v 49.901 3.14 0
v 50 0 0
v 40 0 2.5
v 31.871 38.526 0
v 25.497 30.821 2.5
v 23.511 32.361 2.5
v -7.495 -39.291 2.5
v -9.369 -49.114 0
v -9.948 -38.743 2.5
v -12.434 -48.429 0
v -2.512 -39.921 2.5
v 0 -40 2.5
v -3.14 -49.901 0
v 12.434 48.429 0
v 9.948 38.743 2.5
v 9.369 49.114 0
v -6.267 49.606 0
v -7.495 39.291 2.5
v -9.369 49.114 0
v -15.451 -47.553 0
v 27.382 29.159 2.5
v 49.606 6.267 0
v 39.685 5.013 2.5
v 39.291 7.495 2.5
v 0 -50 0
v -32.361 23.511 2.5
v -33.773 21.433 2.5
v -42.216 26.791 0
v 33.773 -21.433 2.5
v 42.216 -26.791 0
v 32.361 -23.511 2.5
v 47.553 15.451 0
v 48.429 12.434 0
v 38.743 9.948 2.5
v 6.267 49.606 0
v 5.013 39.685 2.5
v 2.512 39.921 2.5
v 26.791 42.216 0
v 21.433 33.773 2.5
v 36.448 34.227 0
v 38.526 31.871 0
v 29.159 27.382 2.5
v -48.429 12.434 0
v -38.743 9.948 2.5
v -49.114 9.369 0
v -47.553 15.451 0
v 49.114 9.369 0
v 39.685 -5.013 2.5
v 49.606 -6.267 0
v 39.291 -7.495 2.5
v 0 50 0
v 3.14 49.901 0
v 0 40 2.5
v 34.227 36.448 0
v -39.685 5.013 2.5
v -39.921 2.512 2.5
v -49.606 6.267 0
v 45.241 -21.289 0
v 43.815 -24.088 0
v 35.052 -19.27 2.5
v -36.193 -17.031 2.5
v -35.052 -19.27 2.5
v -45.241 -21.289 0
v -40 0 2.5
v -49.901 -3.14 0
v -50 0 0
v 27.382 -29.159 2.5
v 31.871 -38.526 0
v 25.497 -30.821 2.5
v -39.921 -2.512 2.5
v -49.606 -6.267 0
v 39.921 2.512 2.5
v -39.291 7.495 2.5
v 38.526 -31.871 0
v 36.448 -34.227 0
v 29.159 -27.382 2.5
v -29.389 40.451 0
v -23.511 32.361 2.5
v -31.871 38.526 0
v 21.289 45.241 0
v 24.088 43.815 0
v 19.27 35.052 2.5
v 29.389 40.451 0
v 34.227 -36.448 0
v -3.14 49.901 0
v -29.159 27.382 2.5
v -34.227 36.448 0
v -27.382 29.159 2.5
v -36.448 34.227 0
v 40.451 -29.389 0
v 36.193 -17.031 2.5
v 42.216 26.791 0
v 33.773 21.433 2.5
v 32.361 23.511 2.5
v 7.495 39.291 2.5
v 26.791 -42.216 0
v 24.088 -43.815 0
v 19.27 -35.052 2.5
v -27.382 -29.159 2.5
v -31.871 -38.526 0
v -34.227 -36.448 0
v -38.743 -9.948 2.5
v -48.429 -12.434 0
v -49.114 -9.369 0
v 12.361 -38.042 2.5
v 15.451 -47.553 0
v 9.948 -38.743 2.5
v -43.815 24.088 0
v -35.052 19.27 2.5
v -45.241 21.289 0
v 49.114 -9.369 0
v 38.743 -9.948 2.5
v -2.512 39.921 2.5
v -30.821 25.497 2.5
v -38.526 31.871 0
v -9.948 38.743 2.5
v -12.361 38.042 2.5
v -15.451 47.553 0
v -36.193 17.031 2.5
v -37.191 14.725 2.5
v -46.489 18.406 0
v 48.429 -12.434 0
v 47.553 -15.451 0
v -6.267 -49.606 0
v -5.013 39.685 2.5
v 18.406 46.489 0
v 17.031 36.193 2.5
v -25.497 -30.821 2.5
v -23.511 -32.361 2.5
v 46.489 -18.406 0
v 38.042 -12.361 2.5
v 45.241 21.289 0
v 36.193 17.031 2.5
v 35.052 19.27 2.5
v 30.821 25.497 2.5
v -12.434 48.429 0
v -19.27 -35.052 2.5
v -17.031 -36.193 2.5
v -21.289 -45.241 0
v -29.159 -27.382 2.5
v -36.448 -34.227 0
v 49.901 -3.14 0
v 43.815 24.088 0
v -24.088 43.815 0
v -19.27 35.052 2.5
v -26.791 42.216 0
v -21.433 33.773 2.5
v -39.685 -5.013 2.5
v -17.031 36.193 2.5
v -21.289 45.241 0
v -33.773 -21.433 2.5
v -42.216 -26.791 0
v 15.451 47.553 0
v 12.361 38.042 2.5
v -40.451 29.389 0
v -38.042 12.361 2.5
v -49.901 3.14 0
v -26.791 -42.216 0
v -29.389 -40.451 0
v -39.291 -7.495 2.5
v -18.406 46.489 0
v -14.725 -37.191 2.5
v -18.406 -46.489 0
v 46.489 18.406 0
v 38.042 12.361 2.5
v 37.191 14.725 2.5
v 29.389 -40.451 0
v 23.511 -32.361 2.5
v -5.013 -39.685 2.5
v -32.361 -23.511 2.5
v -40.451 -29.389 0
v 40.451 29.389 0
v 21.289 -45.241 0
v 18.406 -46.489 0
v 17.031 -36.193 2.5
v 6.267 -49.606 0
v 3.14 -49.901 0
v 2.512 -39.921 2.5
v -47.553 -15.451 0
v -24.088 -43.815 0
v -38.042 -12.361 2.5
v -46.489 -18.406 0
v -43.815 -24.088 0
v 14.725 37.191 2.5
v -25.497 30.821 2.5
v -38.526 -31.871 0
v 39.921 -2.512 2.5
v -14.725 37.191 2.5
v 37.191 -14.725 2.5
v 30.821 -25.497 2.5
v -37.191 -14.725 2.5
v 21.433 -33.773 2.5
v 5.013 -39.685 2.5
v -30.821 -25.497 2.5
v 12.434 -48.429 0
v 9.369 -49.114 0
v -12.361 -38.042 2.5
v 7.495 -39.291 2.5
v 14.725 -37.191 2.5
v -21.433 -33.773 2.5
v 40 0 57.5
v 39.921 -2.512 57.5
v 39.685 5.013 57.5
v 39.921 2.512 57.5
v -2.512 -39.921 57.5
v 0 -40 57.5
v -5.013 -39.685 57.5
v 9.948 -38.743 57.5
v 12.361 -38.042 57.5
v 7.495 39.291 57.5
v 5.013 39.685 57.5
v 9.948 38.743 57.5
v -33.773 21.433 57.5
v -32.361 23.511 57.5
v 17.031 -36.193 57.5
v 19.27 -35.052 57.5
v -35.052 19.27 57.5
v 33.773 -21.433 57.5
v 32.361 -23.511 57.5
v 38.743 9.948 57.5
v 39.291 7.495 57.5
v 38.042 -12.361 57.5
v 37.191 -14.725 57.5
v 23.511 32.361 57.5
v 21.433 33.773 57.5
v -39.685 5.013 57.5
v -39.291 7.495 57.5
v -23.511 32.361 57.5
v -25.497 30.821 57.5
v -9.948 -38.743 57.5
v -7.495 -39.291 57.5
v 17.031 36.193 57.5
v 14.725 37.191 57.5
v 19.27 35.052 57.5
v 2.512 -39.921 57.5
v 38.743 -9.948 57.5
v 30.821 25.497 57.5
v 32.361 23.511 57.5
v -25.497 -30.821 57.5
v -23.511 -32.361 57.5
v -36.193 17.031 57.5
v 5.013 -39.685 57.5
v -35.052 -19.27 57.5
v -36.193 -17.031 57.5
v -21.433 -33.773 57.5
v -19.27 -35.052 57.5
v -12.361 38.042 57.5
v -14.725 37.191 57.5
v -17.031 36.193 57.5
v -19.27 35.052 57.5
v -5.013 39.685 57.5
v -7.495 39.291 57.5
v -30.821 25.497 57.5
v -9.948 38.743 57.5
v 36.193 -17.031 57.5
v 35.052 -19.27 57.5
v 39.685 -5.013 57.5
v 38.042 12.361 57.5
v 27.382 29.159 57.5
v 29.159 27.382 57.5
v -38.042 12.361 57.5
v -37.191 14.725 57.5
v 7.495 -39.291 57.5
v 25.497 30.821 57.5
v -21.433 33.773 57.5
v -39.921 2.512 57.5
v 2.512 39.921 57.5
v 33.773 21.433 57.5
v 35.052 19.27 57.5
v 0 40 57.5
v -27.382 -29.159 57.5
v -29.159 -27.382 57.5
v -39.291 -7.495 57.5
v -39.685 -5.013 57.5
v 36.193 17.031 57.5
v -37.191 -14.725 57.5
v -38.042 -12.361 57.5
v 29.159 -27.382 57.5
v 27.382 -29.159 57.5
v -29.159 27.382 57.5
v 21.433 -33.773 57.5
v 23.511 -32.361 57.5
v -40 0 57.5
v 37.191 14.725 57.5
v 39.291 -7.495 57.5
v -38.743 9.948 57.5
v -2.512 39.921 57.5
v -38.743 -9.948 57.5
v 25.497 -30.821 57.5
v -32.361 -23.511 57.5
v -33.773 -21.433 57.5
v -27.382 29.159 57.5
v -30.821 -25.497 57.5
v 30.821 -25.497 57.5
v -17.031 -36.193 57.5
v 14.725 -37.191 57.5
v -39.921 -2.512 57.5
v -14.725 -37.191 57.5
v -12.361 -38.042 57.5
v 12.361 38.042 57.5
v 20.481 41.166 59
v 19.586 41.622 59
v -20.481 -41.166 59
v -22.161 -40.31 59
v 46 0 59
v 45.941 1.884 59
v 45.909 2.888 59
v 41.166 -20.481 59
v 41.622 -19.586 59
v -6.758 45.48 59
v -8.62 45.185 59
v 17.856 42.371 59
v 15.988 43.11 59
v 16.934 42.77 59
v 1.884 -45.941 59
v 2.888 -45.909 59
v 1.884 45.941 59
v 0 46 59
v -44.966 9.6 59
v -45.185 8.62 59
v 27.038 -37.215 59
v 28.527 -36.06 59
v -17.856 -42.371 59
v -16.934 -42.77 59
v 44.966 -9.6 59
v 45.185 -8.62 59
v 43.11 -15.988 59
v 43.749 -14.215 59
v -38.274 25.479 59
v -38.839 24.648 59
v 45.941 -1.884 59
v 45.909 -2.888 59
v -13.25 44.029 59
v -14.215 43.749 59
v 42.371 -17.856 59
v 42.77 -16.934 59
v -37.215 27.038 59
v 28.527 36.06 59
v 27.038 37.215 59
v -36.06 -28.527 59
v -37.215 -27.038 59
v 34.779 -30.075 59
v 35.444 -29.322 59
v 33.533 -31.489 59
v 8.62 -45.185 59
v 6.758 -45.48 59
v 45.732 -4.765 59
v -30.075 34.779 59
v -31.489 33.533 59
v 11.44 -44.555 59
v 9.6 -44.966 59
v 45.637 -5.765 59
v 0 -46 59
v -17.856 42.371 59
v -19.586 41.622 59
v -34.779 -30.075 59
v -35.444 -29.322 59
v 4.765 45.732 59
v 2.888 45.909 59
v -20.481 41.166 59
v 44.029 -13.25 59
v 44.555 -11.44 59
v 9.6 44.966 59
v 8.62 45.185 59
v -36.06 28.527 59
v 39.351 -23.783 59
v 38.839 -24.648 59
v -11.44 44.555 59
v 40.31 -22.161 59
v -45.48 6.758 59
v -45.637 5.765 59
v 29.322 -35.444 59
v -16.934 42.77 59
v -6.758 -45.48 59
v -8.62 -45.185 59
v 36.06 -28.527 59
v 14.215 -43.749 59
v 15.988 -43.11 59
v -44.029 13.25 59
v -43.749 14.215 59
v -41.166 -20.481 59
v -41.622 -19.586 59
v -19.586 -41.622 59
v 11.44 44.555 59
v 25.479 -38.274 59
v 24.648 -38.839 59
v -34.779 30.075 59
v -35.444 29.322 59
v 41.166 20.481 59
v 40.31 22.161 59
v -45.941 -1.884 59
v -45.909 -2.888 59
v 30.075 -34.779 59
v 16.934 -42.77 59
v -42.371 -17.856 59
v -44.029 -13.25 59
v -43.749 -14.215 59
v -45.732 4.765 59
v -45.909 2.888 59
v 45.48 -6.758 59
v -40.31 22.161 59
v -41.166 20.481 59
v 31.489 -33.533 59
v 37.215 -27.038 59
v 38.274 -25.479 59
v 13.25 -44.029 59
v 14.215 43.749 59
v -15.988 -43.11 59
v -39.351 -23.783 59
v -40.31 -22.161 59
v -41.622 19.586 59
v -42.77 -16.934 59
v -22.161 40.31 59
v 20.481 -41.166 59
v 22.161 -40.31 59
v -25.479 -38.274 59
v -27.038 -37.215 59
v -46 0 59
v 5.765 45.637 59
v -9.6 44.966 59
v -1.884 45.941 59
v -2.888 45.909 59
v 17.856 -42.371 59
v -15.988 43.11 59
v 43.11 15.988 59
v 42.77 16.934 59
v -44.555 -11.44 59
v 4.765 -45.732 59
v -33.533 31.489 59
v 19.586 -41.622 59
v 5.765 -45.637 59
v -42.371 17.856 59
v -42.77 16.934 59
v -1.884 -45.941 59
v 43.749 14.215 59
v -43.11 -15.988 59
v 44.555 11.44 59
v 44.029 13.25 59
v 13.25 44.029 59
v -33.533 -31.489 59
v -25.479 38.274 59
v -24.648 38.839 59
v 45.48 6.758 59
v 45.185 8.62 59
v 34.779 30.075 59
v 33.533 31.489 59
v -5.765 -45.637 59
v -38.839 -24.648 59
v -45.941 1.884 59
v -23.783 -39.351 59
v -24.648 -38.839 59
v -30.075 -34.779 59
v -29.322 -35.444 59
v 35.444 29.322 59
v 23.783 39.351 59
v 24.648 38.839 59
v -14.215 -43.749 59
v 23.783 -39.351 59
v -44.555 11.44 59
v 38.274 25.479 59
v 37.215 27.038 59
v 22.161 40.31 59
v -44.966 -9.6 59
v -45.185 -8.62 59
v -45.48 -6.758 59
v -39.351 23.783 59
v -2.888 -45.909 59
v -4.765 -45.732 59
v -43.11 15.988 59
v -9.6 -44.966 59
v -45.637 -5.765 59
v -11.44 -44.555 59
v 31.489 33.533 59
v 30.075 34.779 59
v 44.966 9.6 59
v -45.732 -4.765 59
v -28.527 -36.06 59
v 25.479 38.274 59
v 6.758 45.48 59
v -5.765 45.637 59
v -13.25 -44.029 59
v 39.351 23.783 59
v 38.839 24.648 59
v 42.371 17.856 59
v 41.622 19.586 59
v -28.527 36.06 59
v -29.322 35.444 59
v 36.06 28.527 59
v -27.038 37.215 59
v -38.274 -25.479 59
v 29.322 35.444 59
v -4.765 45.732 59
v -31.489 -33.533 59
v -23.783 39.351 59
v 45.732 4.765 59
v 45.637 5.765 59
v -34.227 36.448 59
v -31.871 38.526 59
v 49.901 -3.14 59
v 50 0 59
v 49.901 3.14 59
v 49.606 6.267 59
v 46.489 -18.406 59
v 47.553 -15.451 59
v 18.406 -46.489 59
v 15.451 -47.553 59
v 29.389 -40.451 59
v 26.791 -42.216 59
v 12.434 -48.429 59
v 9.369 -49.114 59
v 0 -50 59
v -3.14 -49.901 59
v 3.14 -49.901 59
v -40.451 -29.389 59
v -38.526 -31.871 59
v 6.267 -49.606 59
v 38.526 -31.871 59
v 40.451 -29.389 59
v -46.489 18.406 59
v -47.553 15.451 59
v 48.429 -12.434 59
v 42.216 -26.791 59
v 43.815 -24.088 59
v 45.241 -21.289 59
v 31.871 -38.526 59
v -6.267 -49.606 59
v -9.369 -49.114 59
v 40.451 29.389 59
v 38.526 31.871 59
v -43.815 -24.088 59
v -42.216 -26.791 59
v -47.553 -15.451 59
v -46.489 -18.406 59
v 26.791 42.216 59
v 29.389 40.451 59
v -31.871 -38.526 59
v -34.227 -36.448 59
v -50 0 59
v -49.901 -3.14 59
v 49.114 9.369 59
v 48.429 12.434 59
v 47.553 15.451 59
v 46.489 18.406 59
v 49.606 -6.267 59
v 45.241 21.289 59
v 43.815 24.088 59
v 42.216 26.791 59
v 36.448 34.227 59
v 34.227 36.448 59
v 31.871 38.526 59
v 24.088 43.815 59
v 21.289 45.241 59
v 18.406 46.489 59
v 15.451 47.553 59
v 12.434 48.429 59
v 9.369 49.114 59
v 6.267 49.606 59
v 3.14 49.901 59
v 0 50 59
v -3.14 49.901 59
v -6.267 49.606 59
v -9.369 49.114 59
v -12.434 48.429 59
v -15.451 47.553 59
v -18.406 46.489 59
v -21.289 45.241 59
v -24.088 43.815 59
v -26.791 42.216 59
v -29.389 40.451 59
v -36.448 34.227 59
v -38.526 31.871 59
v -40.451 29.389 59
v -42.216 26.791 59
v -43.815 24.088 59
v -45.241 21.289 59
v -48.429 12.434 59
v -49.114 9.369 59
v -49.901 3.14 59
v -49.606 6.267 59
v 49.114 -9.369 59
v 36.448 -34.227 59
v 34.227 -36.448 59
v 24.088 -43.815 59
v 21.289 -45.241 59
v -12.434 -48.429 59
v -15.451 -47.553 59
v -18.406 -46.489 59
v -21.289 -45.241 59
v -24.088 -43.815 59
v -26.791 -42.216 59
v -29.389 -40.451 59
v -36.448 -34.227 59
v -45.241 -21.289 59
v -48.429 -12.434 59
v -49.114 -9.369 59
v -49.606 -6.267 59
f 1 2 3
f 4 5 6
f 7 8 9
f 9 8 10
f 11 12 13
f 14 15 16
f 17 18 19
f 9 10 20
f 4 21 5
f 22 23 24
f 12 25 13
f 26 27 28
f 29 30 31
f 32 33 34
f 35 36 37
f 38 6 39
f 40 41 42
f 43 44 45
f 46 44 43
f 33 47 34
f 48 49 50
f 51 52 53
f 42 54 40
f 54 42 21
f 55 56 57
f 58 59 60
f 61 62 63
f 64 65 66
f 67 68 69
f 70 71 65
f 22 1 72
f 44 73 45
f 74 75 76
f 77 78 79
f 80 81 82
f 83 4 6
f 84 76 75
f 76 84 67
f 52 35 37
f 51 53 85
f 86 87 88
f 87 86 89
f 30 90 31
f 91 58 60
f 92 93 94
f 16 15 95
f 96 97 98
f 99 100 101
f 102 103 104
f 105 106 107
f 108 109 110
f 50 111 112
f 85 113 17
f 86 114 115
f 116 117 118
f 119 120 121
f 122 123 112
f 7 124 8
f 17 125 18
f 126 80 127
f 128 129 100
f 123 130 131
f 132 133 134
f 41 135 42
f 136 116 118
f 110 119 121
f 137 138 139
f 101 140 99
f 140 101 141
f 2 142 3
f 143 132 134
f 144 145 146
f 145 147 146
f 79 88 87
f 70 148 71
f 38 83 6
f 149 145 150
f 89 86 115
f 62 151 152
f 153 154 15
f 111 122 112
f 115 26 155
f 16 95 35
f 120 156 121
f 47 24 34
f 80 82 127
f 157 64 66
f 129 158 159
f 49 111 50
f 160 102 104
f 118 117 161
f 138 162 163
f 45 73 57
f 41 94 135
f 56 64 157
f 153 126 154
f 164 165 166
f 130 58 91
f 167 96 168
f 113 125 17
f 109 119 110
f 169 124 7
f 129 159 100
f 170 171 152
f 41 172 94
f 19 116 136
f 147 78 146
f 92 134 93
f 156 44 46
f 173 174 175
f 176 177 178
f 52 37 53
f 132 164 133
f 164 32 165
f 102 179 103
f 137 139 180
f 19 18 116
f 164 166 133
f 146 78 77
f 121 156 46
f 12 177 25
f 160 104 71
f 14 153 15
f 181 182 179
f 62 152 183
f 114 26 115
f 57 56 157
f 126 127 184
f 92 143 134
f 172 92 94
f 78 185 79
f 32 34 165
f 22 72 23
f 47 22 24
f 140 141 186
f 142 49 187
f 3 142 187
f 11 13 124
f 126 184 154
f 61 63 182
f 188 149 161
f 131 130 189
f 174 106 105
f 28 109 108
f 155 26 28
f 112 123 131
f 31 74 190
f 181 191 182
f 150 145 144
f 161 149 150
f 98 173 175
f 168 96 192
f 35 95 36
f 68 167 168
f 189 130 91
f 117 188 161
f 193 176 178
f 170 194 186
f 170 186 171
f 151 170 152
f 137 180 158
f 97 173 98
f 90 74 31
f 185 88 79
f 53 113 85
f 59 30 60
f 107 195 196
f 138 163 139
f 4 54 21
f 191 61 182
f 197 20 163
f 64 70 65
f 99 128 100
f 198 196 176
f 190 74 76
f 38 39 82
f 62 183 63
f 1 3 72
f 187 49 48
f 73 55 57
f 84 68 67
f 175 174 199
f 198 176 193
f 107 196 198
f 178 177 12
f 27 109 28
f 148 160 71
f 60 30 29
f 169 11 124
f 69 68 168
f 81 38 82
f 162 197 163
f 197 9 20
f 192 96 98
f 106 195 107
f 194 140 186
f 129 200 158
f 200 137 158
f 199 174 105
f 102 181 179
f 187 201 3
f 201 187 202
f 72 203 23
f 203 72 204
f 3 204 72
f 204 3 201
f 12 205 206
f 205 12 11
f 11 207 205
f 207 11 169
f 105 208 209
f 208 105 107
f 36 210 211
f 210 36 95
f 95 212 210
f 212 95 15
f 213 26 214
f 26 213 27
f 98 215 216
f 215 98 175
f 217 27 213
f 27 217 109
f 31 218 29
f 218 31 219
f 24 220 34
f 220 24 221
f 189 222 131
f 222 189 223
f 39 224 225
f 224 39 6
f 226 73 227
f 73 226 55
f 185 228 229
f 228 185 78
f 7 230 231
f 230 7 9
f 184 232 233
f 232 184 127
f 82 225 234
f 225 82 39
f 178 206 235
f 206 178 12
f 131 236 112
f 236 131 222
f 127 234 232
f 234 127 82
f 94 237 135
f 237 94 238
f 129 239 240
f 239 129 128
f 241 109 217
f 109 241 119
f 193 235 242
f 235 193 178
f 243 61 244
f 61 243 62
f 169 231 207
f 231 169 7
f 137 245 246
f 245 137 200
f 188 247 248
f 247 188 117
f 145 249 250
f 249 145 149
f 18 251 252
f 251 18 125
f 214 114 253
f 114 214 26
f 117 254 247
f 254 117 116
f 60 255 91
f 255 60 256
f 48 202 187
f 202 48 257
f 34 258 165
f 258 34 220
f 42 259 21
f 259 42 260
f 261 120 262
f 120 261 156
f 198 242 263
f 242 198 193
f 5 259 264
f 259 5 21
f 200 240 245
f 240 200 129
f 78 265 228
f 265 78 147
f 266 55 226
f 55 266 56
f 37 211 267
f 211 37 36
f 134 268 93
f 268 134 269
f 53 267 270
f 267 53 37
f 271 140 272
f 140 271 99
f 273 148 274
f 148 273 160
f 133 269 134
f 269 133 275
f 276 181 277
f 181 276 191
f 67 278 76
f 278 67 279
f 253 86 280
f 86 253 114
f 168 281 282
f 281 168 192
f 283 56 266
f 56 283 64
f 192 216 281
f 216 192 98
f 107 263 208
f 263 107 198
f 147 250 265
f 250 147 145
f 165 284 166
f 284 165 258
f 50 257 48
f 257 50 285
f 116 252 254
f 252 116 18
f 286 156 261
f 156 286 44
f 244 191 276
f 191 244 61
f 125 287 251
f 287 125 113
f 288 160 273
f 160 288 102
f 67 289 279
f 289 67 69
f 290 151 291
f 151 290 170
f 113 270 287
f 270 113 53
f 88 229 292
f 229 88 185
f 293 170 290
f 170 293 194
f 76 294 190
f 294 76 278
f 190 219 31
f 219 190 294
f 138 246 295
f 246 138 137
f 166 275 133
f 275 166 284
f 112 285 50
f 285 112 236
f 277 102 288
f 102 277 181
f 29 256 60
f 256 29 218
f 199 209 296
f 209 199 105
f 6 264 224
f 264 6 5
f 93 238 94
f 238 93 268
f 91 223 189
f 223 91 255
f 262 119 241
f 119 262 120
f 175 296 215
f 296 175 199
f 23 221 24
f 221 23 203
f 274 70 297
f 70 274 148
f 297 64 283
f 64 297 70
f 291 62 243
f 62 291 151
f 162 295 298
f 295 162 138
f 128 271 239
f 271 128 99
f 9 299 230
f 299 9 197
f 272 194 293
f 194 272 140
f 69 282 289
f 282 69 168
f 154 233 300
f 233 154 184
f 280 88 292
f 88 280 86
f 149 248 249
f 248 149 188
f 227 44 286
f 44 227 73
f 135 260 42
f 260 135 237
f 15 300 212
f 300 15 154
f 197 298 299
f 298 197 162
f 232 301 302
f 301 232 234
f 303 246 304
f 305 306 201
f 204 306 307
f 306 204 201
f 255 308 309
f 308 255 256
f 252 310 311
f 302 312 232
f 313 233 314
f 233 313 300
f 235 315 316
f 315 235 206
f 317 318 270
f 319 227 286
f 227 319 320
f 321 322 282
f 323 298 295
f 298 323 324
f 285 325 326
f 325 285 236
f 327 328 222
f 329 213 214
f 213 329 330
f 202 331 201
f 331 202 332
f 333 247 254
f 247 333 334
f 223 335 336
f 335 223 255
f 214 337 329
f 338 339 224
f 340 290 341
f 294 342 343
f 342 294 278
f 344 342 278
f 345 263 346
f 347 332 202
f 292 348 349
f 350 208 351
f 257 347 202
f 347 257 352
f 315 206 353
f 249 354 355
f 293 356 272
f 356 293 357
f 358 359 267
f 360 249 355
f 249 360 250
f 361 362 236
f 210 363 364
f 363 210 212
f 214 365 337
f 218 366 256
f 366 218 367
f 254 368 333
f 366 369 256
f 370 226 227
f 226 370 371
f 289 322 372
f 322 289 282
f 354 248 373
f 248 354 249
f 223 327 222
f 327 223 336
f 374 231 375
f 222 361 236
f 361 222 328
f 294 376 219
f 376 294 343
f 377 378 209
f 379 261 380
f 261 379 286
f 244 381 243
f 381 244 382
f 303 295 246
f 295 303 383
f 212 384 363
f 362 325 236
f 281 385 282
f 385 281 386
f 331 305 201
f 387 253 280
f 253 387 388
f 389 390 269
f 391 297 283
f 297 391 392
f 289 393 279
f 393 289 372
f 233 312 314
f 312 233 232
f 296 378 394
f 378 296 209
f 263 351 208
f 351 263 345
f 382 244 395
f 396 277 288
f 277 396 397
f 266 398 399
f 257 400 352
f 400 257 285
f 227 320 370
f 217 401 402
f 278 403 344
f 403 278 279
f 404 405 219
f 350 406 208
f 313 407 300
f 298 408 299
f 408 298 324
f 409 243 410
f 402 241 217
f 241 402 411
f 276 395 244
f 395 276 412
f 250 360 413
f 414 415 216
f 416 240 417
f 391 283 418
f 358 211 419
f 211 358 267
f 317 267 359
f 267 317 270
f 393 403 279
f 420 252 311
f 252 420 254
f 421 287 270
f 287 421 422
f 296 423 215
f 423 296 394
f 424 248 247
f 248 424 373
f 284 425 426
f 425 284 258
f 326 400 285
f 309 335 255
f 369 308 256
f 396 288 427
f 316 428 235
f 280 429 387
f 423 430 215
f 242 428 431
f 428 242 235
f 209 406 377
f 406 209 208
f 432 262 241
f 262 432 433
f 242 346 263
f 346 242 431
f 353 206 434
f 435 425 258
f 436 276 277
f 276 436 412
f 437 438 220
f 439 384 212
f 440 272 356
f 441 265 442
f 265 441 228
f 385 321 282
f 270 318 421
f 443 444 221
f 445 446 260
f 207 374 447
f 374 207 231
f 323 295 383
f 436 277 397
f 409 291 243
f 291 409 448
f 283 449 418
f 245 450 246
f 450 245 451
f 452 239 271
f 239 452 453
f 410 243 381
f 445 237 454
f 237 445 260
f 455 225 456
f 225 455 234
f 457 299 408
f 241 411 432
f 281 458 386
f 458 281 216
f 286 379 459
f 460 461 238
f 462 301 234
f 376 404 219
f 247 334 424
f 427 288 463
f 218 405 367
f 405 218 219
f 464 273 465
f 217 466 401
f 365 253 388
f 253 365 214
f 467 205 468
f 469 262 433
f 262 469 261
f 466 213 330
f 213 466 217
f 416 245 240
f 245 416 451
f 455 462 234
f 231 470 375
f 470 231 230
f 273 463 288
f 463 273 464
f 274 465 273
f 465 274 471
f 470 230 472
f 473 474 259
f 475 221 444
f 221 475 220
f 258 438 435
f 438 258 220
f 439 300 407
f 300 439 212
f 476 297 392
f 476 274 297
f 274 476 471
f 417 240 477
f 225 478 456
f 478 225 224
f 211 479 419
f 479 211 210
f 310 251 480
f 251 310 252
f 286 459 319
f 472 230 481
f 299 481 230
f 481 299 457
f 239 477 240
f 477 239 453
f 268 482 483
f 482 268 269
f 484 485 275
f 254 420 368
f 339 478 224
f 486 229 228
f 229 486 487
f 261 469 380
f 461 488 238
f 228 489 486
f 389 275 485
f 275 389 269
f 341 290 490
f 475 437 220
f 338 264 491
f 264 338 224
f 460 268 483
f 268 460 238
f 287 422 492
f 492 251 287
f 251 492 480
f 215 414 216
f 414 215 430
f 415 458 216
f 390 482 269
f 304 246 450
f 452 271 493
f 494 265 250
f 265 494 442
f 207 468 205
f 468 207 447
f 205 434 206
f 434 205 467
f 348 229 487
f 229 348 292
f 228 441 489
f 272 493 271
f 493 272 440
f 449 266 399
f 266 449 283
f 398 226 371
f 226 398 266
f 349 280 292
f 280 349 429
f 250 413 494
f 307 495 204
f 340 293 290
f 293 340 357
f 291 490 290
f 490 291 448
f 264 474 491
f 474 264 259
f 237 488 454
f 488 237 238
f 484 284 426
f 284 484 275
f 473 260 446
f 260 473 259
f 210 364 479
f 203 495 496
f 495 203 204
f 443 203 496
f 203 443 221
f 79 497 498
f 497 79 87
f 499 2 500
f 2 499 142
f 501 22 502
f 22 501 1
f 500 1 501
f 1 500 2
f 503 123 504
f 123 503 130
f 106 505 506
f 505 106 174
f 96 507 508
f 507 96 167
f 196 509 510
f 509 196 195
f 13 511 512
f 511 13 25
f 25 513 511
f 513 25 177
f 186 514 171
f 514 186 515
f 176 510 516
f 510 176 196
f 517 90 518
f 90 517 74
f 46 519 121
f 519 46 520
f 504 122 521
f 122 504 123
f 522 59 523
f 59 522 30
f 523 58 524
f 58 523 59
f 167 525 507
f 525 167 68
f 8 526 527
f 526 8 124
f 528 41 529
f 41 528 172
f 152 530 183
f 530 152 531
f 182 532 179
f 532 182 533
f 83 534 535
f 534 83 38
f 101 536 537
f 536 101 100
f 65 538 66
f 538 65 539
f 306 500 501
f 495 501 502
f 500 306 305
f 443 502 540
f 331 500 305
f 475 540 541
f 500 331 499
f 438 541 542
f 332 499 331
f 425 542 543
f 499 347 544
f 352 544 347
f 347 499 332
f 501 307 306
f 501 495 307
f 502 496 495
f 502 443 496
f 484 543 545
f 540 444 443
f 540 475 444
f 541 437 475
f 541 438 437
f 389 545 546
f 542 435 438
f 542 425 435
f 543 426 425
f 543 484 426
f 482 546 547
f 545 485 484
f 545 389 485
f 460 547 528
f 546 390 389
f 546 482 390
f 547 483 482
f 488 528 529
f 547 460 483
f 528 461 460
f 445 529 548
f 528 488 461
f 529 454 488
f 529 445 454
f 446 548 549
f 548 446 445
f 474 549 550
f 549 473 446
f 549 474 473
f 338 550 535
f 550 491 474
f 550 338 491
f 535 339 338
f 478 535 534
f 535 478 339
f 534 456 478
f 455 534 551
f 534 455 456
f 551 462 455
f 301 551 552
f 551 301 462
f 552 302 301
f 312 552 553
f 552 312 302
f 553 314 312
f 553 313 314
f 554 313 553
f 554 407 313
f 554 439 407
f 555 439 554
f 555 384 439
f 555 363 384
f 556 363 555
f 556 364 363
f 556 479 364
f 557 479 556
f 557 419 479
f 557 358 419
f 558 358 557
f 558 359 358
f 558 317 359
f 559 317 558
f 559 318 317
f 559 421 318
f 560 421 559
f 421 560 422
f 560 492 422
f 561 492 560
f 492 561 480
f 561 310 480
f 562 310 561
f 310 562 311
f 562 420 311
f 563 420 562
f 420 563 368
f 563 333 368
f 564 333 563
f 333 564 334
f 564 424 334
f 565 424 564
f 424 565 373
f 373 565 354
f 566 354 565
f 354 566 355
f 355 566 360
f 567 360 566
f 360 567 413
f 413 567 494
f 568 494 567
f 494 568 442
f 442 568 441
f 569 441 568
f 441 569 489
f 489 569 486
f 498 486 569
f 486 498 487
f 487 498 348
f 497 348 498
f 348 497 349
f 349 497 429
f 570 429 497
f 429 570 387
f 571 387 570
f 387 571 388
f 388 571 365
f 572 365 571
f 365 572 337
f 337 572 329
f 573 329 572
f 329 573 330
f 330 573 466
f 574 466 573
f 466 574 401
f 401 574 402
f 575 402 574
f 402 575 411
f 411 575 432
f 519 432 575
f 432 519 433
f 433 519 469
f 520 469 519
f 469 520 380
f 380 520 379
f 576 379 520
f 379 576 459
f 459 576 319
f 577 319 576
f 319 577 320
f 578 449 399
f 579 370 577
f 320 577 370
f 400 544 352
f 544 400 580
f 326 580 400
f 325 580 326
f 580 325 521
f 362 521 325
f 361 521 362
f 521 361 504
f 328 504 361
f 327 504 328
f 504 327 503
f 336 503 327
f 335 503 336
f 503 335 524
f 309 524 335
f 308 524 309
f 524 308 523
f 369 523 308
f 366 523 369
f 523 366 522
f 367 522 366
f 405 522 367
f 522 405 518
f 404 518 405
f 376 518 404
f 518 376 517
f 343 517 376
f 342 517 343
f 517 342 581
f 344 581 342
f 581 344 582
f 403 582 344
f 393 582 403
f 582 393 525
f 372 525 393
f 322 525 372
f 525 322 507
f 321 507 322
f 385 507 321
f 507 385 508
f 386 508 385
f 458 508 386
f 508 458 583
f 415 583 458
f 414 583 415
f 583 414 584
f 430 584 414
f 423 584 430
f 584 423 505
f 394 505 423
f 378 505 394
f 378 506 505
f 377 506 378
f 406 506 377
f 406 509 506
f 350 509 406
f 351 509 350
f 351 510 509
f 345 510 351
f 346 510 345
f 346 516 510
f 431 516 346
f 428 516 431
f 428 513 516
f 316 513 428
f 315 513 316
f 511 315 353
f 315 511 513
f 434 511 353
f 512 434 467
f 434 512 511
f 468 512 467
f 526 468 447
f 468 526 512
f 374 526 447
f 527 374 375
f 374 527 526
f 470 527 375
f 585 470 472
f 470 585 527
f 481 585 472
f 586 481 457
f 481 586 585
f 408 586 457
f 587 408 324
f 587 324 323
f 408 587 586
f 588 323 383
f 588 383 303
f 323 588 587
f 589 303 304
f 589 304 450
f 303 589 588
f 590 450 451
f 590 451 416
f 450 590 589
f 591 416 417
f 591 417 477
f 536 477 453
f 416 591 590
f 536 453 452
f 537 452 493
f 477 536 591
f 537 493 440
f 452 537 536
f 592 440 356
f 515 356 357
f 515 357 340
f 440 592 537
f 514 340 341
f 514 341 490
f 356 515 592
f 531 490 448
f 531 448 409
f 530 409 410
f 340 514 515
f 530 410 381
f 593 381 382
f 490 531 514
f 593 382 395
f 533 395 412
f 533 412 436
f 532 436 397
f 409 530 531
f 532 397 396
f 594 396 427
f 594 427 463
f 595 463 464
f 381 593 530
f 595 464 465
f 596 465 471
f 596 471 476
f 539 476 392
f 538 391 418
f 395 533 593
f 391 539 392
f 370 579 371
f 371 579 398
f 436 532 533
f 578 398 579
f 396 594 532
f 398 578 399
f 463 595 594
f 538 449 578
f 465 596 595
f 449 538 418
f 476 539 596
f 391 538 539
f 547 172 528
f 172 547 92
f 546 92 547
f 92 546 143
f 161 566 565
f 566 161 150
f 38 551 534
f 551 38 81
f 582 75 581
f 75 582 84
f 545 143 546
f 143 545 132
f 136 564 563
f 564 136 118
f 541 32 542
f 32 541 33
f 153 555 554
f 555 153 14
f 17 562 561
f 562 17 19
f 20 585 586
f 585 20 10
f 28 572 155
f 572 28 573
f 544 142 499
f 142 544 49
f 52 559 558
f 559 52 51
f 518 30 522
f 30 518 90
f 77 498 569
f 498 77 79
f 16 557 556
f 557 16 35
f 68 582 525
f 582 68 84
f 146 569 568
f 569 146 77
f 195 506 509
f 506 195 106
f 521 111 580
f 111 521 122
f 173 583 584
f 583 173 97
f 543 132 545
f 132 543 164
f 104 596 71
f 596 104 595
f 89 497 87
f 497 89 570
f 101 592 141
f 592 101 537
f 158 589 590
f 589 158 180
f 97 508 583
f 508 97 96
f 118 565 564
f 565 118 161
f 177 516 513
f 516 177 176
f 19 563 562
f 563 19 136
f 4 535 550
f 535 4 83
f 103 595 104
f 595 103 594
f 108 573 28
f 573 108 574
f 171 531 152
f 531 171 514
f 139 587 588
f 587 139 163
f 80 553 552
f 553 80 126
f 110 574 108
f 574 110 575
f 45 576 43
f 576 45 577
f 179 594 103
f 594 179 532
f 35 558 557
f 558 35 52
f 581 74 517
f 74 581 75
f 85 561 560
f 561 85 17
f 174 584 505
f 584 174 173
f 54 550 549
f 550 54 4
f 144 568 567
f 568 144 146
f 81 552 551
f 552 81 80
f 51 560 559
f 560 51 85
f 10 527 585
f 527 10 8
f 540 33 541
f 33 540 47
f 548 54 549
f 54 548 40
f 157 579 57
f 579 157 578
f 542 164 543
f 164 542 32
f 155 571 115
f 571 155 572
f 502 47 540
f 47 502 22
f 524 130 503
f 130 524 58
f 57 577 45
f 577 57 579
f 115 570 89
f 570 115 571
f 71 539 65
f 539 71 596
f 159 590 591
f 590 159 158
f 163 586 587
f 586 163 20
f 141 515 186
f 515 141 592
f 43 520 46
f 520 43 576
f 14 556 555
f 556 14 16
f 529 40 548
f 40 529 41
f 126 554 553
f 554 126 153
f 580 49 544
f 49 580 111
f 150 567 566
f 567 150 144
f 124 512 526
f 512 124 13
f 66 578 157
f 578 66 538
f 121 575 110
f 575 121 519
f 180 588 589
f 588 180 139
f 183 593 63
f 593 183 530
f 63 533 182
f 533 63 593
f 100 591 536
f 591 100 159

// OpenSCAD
r_outer=50;
r_inner=40;
w_outer=60;
w_inner=w_outer-5;

$fn=100;



//difference(){
//	cylinder(r=r_outer,h=w_outer);
//	translate([0,0,-1])cylinder(r=r_inner, h=w_outer*2);
//}


module inner_scope(){
union(){
	cylinder(r1=r_outer, r2=r_inner, h=(w_outer-w_inner)/2);
   translate([0,0,(w_outer-w_inner)/2])cylinder(r=r_inner, h=w_inner);
	translate([0,0,w_inner+(w_outer-w_inner)/2])cylinder(r1=r_inner, r2=r_outer, h=(w_outer-w_inner)/2);
	translate([0,0,-2])cylinder(r=r_outer, h=2);
	translate([0,0,w_outer])cylinder(r=r_outer, h=1);
}
}

union(){
difference(){
	cylinder(r=r_outer, h=w_outer-1);
	inner_scope();
}
}
